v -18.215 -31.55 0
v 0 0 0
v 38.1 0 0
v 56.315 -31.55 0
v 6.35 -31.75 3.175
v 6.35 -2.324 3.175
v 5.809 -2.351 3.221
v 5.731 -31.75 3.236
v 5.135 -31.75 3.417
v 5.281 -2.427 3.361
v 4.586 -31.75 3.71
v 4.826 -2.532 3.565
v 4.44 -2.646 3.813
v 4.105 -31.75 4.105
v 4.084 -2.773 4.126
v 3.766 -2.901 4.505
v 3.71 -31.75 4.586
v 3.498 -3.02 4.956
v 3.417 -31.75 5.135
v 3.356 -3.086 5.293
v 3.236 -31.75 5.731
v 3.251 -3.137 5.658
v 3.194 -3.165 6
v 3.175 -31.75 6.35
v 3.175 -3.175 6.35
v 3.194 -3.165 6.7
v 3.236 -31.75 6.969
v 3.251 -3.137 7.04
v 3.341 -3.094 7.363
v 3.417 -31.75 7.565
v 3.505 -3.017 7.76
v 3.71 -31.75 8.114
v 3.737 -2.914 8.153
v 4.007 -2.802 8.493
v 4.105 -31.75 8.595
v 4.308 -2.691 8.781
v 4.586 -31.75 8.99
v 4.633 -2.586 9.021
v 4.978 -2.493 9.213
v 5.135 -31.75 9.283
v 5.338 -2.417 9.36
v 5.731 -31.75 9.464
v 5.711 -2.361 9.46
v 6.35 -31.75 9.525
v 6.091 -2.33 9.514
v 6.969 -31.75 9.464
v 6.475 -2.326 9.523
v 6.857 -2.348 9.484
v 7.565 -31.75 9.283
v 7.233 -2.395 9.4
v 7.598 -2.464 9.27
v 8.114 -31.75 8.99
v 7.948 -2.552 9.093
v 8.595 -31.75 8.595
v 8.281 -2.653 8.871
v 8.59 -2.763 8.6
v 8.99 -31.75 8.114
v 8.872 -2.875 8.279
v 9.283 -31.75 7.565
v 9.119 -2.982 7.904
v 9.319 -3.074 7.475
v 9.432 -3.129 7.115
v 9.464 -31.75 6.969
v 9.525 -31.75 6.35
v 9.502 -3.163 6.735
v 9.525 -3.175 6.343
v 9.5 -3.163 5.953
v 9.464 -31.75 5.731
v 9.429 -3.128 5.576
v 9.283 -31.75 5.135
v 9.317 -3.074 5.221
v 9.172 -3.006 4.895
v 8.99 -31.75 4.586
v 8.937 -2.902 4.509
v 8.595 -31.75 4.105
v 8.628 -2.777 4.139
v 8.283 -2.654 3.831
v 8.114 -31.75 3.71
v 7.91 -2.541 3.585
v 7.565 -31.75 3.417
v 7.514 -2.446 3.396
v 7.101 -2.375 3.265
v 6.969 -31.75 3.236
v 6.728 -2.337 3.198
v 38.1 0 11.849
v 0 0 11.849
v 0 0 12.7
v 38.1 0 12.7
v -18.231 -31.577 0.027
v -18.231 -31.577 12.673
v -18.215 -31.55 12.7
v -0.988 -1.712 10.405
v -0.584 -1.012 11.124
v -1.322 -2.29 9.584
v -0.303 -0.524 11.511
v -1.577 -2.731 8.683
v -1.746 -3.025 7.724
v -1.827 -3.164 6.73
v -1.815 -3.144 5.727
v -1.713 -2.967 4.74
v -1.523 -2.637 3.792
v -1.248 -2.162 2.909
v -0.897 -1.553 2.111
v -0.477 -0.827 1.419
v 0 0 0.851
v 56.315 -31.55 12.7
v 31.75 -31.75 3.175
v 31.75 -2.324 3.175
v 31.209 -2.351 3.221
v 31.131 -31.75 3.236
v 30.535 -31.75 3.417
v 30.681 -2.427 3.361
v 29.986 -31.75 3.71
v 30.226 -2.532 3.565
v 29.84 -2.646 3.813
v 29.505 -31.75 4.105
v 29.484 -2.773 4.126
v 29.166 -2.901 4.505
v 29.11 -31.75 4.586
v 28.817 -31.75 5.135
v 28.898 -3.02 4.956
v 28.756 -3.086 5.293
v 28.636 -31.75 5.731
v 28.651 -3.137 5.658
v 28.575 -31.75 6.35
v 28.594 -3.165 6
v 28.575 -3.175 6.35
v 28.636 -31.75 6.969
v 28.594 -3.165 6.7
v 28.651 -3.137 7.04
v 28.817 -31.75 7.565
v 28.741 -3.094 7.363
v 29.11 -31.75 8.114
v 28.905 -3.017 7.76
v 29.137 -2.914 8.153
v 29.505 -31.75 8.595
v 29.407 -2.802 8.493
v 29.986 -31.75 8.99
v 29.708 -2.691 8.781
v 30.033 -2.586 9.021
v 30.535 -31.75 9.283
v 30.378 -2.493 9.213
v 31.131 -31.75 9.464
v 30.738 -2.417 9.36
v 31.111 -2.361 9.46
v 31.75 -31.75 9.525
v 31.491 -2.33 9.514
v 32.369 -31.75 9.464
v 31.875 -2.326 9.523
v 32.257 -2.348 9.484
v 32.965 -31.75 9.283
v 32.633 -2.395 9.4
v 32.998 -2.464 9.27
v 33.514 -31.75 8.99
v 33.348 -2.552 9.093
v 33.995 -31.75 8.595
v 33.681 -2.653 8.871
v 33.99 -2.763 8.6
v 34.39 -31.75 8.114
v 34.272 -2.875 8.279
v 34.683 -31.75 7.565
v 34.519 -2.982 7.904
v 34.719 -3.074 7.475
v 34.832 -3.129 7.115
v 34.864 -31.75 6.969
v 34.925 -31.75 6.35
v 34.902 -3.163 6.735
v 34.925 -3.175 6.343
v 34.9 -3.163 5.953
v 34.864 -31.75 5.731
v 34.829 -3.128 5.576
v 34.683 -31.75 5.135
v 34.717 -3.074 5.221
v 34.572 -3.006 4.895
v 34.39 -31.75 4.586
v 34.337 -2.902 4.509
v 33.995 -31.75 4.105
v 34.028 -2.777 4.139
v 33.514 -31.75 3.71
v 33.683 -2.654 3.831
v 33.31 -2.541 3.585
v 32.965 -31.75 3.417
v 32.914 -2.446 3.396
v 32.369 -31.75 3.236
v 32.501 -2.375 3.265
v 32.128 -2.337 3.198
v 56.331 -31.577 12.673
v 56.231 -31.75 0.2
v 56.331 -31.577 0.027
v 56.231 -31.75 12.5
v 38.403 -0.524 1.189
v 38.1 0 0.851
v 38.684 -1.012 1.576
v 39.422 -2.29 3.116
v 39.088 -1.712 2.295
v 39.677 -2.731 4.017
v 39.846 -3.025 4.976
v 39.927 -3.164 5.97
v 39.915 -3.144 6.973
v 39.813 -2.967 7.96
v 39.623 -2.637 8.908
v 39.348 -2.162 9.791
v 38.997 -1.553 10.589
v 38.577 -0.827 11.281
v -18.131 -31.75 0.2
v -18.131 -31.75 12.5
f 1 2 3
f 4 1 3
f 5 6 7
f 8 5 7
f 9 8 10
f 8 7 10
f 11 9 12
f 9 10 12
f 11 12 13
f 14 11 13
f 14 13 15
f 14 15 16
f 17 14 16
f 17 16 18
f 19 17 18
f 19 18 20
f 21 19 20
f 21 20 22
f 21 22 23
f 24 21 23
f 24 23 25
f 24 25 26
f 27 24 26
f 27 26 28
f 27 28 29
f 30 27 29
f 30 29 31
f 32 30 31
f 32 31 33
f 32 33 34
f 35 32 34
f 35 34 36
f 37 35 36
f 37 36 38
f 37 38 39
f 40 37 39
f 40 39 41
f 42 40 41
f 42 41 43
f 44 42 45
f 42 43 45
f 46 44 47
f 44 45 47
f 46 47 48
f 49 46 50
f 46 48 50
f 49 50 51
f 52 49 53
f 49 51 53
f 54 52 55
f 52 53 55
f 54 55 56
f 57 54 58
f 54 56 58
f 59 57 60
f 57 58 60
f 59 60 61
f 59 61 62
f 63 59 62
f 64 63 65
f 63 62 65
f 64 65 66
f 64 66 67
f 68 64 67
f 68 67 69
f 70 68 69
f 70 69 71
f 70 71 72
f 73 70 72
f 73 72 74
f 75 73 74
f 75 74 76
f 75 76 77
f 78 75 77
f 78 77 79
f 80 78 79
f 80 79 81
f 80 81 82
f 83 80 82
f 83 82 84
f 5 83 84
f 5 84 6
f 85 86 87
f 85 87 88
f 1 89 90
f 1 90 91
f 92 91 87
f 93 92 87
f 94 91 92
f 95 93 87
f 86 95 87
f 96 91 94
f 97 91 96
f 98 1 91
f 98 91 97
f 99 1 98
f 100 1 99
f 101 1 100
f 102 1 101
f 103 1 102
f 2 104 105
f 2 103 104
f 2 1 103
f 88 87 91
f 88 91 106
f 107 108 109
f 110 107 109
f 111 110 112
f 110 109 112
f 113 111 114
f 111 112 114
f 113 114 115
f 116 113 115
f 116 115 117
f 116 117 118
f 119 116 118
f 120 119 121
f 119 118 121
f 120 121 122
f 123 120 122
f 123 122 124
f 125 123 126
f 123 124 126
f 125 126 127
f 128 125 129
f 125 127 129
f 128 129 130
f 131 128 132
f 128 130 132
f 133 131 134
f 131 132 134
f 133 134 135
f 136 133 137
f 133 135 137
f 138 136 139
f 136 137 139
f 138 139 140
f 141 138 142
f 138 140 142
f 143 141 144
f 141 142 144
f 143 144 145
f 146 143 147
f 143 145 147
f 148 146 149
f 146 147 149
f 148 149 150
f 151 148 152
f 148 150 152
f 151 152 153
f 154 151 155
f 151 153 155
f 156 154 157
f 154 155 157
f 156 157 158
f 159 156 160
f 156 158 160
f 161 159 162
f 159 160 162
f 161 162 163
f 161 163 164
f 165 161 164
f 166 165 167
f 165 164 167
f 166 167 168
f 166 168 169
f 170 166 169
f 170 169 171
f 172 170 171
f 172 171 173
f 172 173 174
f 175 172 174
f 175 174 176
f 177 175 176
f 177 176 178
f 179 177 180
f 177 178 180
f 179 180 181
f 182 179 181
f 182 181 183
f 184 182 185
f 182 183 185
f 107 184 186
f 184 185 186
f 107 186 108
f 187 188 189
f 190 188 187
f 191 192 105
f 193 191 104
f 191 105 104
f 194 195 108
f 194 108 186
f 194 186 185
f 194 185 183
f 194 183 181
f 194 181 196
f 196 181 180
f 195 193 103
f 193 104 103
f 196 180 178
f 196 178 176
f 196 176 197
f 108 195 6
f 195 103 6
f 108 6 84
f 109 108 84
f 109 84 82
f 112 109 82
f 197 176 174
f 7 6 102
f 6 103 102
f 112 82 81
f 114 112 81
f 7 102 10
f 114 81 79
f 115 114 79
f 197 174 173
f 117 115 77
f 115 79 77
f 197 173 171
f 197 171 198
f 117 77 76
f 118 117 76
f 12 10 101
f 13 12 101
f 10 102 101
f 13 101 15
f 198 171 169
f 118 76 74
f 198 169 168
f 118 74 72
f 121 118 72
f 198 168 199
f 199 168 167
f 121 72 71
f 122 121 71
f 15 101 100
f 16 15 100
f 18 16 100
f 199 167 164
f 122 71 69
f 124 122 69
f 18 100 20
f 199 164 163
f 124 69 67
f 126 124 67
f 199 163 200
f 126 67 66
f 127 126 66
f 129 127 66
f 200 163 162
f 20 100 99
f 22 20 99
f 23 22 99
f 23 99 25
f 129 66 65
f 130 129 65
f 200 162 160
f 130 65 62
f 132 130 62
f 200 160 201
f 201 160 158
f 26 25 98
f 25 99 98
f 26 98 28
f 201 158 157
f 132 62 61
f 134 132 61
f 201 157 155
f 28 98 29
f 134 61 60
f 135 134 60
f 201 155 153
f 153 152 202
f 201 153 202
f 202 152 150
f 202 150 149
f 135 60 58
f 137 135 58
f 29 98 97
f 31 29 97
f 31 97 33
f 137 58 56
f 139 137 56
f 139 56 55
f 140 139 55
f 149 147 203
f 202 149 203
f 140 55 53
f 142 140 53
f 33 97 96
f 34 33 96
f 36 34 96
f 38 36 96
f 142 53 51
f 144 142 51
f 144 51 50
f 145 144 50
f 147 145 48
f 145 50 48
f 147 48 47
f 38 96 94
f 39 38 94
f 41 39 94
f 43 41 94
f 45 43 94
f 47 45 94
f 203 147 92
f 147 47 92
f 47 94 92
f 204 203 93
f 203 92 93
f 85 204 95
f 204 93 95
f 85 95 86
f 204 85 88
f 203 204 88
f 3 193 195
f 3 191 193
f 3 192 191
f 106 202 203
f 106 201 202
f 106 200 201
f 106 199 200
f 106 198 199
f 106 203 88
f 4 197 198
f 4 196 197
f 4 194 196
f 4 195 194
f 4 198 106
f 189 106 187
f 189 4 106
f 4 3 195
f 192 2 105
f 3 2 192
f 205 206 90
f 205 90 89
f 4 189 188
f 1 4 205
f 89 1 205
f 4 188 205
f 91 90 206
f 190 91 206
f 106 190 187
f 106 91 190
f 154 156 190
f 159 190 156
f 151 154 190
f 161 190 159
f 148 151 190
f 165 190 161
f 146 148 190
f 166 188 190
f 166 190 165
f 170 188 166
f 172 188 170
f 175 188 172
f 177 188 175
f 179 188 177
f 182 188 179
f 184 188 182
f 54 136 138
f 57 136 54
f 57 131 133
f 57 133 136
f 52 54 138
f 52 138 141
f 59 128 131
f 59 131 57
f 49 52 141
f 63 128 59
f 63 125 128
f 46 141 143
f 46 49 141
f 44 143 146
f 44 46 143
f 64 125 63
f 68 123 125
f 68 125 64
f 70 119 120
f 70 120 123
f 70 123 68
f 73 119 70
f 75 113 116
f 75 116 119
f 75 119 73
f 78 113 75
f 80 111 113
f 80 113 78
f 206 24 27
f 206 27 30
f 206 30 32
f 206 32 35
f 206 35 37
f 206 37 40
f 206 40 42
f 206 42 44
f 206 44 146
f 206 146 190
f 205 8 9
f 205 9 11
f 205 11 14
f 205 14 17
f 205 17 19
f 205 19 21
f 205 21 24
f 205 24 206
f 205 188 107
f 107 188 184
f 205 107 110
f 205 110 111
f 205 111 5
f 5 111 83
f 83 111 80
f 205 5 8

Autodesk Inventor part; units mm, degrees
ref_plane "YZ Plane" through (0, 0, 0) normal (1, 0, 0) x (0, 1, 0)
ref_plane "XZ Plane" through (0, 0, 0) normal (0, 1, 0) x (-1, 0, 0)
sketch "Sketch1" plane through (0, 0, 0) normal (0, 0, 1) x (1, 0, 0)
  line L0 (0, 0) -> (38.1, 0)
  line L1 (38.1, 0) -> (56.4309, -31.75)
  line L2 (56.4309, -31.75) -> (-18.3309, -31.75)
  line L3 (-18.3309, -31.75) -> (0, 0)
  dimension "d0" = 38.1
  dimension "d1" = 60
  dimension "d2" = 31.75
extrude "Extrusion1" add sketch "Sketch1" along normal blind 12.7
ref_plane "Work Plane1" through (-3.175, 0, 0) normal (1, 0, 0) x (0, 1, 0)
sketch "Sketch2" plane through (-3.175, 0, 0) normal (1, 0, 0) x (0, 1, 0)
  line L0 (0, 0) -> (0, 12.7)
  circle A0 centre (3.175, 6.35) radius 6.35
  dimension "d5" = 3.175
  dimension "d6" = 12.7
  dimension "d7" = 9.525
extrude "Extrusion2" cut sketch "Sketch2" along normal through all
sketch "Sketch3" plane through (-18.3309, -31.75, 0) normal (0, -1, 0) x (1, 0, 0)
  line L0 (74.7617, 12.7) -> (0, 12.7) projected
  line L1 (74.7617, 0) -> (0, 0) projected
  line L2 (74.7617, 0) -> (74.7617, 12.7) projected
  line L3 (37.3809, 12.7) -> (37.3809, 0) construction
  line L4 (0.4848, 6.35) -> (74.7617, 6.35) construction
  point P0 (24.6809, 6.35)
  point P1 (50.0809, 6.35)
  dimension "d11" = 12.7
  dimension "d12" = 25.4
hole "Hole1" at (6.35, -31.75, 6.35) at (31.75, -31.75, 6.35) direction (0, 1, 0) diameter 6.35 end through all
chamfer "Chamfer1" distance 0.2 angle 45 4 edges at (19.05, -31.75, 12.7) (-18.3309, -31.75, 6.35) (19.05, -31.75, 0) (56.4309, -31.75, 6.35)
properties part number "PWTR-0039" material "Aluminum-6061"
